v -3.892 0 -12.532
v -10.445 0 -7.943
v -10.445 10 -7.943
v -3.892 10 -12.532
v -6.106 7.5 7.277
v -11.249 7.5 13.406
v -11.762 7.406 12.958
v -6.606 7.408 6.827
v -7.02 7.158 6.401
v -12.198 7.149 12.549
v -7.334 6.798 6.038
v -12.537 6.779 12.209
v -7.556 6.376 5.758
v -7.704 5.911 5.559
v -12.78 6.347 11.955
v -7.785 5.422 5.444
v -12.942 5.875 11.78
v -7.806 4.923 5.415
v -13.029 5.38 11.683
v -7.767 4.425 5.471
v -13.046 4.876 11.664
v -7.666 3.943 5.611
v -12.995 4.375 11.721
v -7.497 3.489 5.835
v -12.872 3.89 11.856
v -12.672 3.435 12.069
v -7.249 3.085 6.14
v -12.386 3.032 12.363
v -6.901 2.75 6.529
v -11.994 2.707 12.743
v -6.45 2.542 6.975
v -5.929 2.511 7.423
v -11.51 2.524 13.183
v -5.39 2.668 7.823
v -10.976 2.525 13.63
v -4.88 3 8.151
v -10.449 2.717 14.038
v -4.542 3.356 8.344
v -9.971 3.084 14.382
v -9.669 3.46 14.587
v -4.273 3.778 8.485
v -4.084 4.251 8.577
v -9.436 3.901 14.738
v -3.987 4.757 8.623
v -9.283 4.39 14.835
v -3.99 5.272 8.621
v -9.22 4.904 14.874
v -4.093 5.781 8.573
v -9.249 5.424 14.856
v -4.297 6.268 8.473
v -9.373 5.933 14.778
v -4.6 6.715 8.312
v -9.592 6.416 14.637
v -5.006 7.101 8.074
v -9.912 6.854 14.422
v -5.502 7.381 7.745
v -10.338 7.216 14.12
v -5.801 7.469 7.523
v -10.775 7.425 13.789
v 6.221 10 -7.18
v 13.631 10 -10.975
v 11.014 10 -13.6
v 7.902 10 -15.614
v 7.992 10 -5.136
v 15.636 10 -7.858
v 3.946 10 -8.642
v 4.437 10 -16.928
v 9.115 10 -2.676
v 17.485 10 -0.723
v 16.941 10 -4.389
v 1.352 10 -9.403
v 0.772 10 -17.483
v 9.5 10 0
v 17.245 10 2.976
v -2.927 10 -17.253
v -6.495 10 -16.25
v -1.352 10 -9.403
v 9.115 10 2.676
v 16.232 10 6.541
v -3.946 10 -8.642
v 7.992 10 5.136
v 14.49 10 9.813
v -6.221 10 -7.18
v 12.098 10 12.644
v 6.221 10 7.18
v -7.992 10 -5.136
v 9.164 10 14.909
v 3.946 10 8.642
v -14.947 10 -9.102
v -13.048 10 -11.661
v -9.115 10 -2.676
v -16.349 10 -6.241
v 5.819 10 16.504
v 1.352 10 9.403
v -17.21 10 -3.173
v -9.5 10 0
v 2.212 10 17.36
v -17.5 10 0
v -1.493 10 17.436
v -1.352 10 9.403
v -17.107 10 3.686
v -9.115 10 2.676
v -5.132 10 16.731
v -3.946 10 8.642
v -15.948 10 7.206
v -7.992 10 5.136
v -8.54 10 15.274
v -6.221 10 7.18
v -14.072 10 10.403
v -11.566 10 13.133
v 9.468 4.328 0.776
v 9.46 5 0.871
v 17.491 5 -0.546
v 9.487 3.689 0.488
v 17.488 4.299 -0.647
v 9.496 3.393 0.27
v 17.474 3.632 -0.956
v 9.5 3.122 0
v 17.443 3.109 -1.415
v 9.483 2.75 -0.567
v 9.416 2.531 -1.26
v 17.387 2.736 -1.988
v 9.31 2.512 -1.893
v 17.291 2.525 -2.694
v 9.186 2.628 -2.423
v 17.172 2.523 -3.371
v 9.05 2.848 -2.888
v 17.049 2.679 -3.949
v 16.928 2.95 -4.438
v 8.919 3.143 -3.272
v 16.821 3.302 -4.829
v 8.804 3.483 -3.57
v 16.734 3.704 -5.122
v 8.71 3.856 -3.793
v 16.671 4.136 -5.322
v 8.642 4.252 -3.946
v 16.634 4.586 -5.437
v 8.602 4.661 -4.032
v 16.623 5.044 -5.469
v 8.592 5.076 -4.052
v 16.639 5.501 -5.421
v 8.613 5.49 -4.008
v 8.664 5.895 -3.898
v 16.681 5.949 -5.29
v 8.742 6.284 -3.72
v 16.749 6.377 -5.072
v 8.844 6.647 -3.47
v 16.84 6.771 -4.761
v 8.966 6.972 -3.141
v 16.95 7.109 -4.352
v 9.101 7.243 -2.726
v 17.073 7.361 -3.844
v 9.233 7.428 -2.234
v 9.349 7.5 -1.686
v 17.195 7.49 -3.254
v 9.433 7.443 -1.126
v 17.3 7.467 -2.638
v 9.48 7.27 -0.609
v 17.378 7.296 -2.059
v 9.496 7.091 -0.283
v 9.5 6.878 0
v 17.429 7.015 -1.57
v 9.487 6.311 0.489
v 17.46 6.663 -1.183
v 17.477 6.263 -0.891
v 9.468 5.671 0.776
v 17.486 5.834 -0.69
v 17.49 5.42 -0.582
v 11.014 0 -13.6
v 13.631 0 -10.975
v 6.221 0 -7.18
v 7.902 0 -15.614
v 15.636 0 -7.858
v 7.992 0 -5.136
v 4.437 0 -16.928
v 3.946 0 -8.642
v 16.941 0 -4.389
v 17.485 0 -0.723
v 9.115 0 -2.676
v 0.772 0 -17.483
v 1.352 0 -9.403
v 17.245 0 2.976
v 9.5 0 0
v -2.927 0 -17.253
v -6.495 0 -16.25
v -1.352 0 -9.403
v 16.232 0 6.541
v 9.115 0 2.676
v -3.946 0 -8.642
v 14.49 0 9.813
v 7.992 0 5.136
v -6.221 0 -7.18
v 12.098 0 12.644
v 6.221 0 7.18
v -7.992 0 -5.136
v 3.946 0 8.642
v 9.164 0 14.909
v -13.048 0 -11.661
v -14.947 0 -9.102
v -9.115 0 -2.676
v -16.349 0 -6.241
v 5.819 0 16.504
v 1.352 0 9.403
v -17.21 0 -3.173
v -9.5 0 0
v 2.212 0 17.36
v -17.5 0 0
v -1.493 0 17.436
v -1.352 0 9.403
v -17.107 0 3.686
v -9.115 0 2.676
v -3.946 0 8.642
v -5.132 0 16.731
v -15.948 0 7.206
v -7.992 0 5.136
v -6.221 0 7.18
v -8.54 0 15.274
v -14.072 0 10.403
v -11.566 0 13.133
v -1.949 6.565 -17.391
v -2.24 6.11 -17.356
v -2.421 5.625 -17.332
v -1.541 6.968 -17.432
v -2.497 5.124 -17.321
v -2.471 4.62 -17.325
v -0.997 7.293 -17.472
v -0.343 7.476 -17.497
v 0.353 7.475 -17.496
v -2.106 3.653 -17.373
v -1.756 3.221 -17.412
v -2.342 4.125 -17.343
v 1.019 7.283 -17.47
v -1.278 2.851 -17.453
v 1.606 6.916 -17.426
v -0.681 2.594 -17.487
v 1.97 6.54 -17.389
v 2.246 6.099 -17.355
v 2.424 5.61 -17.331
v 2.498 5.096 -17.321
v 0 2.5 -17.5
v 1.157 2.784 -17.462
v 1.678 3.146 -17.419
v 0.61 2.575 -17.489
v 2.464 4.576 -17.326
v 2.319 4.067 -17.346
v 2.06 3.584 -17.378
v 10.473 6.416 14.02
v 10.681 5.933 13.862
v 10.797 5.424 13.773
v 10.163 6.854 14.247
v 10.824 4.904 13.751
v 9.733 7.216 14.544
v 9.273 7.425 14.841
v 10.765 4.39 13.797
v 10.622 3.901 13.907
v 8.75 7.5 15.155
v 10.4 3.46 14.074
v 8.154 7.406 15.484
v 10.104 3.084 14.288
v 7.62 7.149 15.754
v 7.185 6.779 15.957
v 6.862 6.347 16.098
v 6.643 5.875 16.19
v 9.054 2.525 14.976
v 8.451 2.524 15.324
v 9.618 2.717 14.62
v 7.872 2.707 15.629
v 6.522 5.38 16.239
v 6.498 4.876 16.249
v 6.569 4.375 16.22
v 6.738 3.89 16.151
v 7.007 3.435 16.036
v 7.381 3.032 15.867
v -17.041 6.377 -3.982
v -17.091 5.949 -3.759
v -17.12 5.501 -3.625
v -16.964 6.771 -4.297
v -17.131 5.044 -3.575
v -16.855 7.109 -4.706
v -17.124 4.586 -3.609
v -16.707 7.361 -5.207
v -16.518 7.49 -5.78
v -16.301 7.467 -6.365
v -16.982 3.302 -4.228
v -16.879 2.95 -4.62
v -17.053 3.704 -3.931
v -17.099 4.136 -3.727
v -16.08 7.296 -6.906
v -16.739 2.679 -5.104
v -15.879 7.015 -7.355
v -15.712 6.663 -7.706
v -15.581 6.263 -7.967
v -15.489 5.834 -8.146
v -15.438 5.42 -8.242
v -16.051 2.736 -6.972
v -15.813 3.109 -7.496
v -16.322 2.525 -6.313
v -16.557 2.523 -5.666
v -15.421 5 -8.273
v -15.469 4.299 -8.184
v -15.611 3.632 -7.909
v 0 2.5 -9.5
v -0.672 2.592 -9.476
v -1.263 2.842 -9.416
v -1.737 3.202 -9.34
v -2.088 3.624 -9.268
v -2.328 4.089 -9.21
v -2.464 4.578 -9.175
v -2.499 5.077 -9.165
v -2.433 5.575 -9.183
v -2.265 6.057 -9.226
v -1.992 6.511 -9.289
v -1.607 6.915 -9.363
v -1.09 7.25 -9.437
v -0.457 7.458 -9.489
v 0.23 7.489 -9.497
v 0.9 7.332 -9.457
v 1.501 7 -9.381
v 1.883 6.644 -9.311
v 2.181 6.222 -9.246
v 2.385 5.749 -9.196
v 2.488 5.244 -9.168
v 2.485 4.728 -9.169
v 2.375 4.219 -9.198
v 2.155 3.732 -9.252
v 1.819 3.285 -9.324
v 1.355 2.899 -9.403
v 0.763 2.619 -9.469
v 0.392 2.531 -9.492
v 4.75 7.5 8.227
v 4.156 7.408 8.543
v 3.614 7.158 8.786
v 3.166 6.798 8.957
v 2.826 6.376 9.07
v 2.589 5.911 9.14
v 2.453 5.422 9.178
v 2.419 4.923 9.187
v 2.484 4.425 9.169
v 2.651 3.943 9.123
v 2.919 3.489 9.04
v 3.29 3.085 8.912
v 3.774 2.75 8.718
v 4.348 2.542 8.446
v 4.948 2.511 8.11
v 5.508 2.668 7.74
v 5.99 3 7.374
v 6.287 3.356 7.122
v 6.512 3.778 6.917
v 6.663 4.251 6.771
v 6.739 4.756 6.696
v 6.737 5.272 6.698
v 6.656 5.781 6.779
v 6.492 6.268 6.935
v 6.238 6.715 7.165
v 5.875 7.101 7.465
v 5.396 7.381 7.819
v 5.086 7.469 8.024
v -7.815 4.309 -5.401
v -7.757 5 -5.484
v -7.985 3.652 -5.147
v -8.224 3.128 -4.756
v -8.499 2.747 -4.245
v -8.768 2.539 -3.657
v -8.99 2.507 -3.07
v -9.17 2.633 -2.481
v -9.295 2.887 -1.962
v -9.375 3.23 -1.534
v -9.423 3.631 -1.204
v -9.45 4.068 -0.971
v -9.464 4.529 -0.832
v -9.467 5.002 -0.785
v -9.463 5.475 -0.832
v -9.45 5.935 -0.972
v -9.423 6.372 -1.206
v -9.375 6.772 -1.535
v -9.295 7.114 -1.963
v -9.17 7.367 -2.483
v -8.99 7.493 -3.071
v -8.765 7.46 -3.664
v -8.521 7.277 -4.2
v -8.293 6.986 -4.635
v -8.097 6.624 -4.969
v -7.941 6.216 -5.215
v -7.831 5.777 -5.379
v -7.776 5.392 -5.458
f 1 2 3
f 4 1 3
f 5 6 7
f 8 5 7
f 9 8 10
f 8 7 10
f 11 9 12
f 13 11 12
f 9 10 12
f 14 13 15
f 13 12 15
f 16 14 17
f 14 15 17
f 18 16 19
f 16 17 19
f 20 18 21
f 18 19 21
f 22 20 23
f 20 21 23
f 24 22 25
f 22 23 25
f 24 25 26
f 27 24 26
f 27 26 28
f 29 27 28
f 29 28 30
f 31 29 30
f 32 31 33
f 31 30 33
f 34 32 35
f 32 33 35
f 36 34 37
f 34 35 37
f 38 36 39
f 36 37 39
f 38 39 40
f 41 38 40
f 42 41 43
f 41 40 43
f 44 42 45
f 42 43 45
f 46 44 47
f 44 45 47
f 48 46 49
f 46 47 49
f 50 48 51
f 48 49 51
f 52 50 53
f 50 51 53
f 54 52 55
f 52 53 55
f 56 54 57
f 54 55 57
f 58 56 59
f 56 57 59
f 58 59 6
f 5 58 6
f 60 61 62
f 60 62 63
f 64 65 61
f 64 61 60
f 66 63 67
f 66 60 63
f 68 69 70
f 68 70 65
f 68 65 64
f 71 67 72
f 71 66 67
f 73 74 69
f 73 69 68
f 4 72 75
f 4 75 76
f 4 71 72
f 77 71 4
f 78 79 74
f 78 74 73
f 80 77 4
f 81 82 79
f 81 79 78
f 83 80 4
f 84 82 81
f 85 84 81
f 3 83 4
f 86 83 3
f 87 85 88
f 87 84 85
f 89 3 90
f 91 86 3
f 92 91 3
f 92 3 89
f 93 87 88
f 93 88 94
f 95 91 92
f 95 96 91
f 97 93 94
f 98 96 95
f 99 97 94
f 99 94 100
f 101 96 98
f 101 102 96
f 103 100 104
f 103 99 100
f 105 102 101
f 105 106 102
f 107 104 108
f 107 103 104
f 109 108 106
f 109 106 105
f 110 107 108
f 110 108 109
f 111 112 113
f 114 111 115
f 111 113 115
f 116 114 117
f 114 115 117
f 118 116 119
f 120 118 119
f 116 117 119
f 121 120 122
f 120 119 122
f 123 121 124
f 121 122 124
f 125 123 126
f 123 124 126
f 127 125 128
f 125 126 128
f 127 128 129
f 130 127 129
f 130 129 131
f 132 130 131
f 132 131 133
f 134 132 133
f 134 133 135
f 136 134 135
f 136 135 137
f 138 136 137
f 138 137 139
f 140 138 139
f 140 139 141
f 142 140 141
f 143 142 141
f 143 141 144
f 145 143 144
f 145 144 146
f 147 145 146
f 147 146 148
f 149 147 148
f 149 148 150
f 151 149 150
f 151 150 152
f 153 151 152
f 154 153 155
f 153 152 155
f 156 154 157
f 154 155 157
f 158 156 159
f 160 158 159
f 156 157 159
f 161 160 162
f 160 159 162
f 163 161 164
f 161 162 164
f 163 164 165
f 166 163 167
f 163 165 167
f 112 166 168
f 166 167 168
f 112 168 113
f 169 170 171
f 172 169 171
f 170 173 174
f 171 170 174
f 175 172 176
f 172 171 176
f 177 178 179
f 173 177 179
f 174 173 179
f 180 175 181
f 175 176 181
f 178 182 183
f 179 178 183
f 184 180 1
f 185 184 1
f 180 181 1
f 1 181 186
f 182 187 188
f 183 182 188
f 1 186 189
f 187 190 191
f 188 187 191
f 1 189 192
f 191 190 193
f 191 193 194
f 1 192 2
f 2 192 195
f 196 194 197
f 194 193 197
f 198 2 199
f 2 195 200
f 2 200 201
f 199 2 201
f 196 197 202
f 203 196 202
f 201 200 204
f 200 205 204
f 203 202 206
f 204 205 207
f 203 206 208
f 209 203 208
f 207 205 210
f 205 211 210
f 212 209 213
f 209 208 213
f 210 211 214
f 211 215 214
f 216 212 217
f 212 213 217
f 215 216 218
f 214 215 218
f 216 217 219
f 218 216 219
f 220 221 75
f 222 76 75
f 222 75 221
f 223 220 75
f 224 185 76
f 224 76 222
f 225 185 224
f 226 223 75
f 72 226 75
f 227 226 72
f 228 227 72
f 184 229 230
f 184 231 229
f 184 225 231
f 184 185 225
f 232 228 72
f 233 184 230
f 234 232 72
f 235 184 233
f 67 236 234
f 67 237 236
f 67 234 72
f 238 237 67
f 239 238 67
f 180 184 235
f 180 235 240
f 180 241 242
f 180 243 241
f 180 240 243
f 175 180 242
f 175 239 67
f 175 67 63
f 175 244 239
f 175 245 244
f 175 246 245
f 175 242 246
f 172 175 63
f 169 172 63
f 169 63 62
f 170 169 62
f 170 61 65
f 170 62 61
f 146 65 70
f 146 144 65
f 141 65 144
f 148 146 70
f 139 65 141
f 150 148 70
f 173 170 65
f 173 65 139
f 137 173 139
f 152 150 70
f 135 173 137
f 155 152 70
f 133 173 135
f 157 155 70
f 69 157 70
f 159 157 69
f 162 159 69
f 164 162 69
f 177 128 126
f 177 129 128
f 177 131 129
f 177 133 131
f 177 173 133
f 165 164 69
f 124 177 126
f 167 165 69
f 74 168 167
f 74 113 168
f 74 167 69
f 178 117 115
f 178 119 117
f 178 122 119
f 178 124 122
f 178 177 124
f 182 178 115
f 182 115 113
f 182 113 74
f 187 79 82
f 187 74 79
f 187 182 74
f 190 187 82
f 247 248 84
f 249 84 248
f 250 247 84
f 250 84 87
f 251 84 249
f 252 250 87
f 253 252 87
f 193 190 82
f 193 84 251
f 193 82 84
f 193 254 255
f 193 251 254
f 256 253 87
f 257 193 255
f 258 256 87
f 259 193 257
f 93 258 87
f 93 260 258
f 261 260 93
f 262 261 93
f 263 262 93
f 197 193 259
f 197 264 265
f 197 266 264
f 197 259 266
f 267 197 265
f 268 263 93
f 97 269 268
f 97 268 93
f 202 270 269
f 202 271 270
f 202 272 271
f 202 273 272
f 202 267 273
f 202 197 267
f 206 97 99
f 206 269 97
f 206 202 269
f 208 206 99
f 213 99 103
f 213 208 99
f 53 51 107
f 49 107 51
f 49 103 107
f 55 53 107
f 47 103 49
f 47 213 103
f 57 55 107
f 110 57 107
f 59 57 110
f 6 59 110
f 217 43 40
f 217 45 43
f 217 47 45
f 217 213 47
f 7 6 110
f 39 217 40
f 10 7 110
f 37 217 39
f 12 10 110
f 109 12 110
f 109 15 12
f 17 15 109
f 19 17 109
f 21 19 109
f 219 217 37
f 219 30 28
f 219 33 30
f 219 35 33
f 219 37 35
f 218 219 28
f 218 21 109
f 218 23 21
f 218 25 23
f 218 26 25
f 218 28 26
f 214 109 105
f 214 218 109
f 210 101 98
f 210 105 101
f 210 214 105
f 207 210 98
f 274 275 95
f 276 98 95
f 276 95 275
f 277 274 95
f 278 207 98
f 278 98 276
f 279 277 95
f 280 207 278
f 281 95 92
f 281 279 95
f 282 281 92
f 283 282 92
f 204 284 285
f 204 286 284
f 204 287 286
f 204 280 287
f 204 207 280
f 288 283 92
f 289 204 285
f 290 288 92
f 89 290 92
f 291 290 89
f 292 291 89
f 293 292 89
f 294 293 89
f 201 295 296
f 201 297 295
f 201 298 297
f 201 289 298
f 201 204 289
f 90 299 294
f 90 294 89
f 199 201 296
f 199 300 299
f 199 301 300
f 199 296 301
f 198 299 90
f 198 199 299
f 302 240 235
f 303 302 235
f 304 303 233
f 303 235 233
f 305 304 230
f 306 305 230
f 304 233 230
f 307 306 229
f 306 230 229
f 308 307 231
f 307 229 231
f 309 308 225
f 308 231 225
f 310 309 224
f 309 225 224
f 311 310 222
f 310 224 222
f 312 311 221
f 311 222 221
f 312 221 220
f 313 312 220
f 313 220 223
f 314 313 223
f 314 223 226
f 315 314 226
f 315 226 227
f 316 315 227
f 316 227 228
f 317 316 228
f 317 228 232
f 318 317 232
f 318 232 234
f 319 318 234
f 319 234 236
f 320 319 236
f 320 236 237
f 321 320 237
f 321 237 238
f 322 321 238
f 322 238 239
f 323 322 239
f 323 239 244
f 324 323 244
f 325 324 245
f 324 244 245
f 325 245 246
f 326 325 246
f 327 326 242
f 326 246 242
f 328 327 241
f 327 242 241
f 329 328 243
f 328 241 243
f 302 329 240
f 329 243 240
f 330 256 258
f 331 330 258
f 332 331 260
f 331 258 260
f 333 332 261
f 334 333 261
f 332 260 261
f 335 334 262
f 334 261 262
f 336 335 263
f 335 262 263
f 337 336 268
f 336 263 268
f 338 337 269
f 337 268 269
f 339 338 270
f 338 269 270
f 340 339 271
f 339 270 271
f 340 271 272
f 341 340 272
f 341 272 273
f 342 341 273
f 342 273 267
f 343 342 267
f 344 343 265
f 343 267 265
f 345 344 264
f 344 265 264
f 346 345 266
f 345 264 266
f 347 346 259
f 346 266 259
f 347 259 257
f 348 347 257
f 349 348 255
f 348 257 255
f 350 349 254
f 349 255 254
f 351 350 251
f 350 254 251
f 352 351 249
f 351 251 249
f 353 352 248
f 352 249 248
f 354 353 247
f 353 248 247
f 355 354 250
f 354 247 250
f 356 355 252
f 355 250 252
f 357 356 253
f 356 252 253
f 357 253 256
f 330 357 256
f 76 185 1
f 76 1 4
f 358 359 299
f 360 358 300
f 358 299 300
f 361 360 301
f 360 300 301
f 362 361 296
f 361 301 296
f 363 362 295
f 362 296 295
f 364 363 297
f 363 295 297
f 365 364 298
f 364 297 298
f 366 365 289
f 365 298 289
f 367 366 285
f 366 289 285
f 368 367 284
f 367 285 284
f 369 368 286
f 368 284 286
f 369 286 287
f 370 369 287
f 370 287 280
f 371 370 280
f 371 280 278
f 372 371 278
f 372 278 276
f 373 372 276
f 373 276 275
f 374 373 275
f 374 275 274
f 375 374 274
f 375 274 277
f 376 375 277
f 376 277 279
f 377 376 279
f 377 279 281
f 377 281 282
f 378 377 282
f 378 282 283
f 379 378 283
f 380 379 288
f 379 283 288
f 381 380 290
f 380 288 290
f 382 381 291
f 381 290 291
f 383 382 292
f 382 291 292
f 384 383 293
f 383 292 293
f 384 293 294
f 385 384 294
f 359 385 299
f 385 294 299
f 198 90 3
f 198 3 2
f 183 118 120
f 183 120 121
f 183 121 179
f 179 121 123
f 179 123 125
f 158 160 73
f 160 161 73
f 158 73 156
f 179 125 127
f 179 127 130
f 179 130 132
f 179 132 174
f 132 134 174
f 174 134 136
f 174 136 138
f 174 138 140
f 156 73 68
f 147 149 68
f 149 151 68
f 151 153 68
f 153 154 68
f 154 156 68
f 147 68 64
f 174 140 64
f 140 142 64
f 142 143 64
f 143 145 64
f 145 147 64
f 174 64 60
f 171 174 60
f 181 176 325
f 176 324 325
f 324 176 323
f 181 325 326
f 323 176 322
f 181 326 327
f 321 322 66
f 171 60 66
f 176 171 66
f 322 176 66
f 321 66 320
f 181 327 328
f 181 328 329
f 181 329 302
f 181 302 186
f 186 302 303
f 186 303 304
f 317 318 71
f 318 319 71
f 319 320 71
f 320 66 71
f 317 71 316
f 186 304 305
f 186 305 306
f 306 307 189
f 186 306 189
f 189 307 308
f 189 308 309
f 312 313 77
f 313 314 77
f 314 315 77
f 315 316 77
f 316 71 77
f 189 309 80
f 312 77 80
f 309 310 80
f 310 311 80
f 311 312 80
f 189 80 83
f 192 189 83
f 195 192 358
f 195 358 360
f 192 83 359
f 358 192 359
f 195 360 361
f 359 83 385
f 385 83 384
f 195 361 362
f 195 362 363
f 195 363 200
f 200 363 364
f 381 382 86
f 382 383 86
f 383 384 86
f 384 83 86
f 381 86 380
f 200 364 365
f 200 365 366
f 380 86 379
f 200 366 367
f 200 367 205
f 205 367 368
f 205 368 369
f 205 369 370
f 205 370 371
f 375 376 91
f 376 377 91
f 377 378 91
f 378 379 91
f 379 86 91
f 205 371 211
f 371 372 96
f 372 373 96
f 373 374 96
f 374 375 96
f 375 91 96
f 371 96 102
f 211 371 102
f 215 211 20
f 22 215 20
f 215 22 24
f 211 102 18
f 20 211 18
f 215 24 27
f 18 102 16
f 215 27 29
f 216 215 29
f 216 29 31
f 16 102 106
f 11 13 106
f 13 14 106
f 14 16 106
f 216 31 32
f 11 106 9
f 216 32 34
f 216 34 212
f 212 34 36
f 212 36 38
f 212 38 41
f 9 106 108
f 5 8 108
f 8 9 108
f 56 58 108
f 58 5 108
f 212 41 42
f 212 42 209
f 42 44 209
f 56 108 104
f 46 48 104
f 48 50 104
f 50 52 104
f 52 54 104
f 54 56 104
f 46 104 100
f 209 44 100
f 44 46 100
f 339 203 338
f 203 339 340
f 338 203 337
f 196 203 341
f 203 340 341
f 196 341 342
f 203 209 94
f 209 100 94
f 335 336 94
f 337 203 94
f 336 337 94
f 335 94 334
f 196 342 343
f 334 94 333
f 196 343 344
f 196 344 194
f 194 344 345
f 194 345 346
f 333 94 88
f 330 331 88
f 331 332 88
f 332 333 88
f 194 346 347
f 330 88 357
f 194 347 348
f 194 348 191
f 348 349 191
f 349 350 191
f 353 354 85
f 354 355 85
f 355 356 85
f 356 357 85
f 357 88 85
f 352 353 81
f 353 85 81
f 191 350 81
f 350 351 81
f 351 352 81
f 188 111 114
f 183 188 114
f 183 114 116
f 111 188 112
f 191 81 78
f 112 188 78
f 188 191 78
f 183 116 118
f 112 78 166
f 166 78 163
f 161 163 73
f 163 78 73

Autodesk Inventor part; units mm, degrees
sketch "Sketch1" plane through (0, 0, 0) normal (0, 1, 0) x (-1, 0, 0)
  circle A0 centre (0, 0) radius 17.5
  dimension "d0" = 35
extrude "Extrusion1" add sketch "Sketch1" along normal blind 10
sketch "Sketch2" plane through (0, 10, 0) normal (0, 1, 0) x (1, 0, 0)
  circle A0 centre (0, 0) radius 9.5
  dimension "d3" = 19
extrude "Extrusion2" cut sketch "Sketch2" against normal through all
ref_plane "Work Plane13" through (0, 0, 0) normal (0, 0, 1) x (0, 1, 0)
sketch "Sketch11" plane through (0, 0, 0) normal (0, 0, 1) x (0, 1, 0)
  circle A0 centre (5, 0) radius 2.5
  point P0 (0, 0)
  dimension "d52" = 5
hole "Hole5" at (0, 5, 0) direction (0, 0, -1) diameter 5 end through all
ref_plane "Work Plane14" through (0, 0, 0) normal (0.9397, 0, 0.342) x (0, 1, 0)
sketch "Sketch12" plane through (0, 0, 0) normal (0.9397, 0, 0.342) x (0, 1, 0)
  circle A0 centre (5, 0) radius 2.5
  point P0 (0, 0)
  dimension "d61" = 5
hole "Hole6" at (0, 5, 0) direction (-0.9397, 0, -0.342) diameter 5 end through all
ref_plane "Work Plane15" through (0, 0, 0) normal (0.6428, 0, -0.766) x (0, 1, 0)
sketch "Sketch13" plane through (0, 0, 0) normal (0.6428, 0, -0.766) x (0, 1, 0)
  circle A0 centre (5, 0) radius 2.5
  point P0 (0, 0)
  dimension "d70" = 5
hole "Hole7" at (0, 5, 0) direction (-0.6428, 0, 0.766) diameter 5 end through all
ref_plane "Work Plane16" through (0, 0, 0) normal (-0.5, 0, -0.866) x (0, 1, 0)
sketch "Sketch14" plane through (0, 0, 0) normal (-0.5, 0, -0.866) x (0, 1, 0)
  circle A0 centre (5, 0) radius 2.5
  point P0 (0, 0)
  dimension "d79" = 5
hole "Hole8" at (0, 5, 0) direction (0.5, 0, 0.866) diameter 5 end through all
ref_plane "Work Plane17" through (0, 0, 0) normal (-0.9848, 0, 0.1736) x (0, 1, 0)
sketch "Sketch15" plane through (0, 0, 0) normal (-0.9848, 0, 0.1736) x (0, 1, 0)
  circle A0 centre (5, 0) radius 2.5
  point P0 (0, 0)
  dimension "d88" = 5
hole "Hole9" at (0, 5, 0) direction (0.9848, 0, -0.1736) diameter 5 end through all
ref_plane "Work Plane21" through (-10.0376, 0, -14.3352) normal (0.5736, 0, 0.8192) x (0, 1, 0)
ref_plane "Work Plane20" through (0, 0, 0) normal (0.5736, 0, 0.8192) x (0, 1, 0)
sketch "Sketch16" plane through (-10.0376, 0, -14.3352) normal (0.5736, 0, 0.8192) x (0, 1, 0)
  line L0 (10, 4) -> (0, 4)
  line L1 (0, 4) -> (0, -4)
  line L2 (0, -4) -> (10, -4)
  line L3 (10, -4) -> (10, 4)
  line L4 (0, 17.5) -> (0, -17.5)
  line L5 (18.3389, 0) -> (-7, 0) construction
  point P0 (0, 0)
  dimension "d100" = 8
  dimension "d107" = 4
  dimension "d108" = 10
extrude "Extrusion4" cut sketch "Sketch16" along normal blind 5
sketch "Sketch17" plane through (0, 0, 0) normal (0, -1, 0) x (1, 0, 0)
  line L0 (0, 0) -> (-16.3488, -23.3485) construction
  line L1 (-10.4463, -7.9451) -> (-13.0485, -11.6614) construction
  line L2 (-6.4953, -16.25) -> (-3.8931, -12.5337) construction
  line L3 (-3.8931, -12.5337) -> (-6.4953, -16.25) projected
  arc A0 (-6.4953, -16.25) -> (-13.0485, -11.6614) centre (0, 0) ccw projected
  line L4 (-13.0485, -11.6614) -> (-10.4463, -7.9451) projected
  line L5 (-10.4463, -7.9451) -> (-3.8931, -12.5337) projected
  circle A1 centre (0, 0) radius 9.5 projected
  point P0 (-10.0012, -14.2832)
  dimension "d114" = 26.426
  dimension "d115" = 13.213
equation "\"d107\" = 0.5 * d100"
equation "\"d115\" = 0.5 * d114"
properties part number "sprzeglo_04"
